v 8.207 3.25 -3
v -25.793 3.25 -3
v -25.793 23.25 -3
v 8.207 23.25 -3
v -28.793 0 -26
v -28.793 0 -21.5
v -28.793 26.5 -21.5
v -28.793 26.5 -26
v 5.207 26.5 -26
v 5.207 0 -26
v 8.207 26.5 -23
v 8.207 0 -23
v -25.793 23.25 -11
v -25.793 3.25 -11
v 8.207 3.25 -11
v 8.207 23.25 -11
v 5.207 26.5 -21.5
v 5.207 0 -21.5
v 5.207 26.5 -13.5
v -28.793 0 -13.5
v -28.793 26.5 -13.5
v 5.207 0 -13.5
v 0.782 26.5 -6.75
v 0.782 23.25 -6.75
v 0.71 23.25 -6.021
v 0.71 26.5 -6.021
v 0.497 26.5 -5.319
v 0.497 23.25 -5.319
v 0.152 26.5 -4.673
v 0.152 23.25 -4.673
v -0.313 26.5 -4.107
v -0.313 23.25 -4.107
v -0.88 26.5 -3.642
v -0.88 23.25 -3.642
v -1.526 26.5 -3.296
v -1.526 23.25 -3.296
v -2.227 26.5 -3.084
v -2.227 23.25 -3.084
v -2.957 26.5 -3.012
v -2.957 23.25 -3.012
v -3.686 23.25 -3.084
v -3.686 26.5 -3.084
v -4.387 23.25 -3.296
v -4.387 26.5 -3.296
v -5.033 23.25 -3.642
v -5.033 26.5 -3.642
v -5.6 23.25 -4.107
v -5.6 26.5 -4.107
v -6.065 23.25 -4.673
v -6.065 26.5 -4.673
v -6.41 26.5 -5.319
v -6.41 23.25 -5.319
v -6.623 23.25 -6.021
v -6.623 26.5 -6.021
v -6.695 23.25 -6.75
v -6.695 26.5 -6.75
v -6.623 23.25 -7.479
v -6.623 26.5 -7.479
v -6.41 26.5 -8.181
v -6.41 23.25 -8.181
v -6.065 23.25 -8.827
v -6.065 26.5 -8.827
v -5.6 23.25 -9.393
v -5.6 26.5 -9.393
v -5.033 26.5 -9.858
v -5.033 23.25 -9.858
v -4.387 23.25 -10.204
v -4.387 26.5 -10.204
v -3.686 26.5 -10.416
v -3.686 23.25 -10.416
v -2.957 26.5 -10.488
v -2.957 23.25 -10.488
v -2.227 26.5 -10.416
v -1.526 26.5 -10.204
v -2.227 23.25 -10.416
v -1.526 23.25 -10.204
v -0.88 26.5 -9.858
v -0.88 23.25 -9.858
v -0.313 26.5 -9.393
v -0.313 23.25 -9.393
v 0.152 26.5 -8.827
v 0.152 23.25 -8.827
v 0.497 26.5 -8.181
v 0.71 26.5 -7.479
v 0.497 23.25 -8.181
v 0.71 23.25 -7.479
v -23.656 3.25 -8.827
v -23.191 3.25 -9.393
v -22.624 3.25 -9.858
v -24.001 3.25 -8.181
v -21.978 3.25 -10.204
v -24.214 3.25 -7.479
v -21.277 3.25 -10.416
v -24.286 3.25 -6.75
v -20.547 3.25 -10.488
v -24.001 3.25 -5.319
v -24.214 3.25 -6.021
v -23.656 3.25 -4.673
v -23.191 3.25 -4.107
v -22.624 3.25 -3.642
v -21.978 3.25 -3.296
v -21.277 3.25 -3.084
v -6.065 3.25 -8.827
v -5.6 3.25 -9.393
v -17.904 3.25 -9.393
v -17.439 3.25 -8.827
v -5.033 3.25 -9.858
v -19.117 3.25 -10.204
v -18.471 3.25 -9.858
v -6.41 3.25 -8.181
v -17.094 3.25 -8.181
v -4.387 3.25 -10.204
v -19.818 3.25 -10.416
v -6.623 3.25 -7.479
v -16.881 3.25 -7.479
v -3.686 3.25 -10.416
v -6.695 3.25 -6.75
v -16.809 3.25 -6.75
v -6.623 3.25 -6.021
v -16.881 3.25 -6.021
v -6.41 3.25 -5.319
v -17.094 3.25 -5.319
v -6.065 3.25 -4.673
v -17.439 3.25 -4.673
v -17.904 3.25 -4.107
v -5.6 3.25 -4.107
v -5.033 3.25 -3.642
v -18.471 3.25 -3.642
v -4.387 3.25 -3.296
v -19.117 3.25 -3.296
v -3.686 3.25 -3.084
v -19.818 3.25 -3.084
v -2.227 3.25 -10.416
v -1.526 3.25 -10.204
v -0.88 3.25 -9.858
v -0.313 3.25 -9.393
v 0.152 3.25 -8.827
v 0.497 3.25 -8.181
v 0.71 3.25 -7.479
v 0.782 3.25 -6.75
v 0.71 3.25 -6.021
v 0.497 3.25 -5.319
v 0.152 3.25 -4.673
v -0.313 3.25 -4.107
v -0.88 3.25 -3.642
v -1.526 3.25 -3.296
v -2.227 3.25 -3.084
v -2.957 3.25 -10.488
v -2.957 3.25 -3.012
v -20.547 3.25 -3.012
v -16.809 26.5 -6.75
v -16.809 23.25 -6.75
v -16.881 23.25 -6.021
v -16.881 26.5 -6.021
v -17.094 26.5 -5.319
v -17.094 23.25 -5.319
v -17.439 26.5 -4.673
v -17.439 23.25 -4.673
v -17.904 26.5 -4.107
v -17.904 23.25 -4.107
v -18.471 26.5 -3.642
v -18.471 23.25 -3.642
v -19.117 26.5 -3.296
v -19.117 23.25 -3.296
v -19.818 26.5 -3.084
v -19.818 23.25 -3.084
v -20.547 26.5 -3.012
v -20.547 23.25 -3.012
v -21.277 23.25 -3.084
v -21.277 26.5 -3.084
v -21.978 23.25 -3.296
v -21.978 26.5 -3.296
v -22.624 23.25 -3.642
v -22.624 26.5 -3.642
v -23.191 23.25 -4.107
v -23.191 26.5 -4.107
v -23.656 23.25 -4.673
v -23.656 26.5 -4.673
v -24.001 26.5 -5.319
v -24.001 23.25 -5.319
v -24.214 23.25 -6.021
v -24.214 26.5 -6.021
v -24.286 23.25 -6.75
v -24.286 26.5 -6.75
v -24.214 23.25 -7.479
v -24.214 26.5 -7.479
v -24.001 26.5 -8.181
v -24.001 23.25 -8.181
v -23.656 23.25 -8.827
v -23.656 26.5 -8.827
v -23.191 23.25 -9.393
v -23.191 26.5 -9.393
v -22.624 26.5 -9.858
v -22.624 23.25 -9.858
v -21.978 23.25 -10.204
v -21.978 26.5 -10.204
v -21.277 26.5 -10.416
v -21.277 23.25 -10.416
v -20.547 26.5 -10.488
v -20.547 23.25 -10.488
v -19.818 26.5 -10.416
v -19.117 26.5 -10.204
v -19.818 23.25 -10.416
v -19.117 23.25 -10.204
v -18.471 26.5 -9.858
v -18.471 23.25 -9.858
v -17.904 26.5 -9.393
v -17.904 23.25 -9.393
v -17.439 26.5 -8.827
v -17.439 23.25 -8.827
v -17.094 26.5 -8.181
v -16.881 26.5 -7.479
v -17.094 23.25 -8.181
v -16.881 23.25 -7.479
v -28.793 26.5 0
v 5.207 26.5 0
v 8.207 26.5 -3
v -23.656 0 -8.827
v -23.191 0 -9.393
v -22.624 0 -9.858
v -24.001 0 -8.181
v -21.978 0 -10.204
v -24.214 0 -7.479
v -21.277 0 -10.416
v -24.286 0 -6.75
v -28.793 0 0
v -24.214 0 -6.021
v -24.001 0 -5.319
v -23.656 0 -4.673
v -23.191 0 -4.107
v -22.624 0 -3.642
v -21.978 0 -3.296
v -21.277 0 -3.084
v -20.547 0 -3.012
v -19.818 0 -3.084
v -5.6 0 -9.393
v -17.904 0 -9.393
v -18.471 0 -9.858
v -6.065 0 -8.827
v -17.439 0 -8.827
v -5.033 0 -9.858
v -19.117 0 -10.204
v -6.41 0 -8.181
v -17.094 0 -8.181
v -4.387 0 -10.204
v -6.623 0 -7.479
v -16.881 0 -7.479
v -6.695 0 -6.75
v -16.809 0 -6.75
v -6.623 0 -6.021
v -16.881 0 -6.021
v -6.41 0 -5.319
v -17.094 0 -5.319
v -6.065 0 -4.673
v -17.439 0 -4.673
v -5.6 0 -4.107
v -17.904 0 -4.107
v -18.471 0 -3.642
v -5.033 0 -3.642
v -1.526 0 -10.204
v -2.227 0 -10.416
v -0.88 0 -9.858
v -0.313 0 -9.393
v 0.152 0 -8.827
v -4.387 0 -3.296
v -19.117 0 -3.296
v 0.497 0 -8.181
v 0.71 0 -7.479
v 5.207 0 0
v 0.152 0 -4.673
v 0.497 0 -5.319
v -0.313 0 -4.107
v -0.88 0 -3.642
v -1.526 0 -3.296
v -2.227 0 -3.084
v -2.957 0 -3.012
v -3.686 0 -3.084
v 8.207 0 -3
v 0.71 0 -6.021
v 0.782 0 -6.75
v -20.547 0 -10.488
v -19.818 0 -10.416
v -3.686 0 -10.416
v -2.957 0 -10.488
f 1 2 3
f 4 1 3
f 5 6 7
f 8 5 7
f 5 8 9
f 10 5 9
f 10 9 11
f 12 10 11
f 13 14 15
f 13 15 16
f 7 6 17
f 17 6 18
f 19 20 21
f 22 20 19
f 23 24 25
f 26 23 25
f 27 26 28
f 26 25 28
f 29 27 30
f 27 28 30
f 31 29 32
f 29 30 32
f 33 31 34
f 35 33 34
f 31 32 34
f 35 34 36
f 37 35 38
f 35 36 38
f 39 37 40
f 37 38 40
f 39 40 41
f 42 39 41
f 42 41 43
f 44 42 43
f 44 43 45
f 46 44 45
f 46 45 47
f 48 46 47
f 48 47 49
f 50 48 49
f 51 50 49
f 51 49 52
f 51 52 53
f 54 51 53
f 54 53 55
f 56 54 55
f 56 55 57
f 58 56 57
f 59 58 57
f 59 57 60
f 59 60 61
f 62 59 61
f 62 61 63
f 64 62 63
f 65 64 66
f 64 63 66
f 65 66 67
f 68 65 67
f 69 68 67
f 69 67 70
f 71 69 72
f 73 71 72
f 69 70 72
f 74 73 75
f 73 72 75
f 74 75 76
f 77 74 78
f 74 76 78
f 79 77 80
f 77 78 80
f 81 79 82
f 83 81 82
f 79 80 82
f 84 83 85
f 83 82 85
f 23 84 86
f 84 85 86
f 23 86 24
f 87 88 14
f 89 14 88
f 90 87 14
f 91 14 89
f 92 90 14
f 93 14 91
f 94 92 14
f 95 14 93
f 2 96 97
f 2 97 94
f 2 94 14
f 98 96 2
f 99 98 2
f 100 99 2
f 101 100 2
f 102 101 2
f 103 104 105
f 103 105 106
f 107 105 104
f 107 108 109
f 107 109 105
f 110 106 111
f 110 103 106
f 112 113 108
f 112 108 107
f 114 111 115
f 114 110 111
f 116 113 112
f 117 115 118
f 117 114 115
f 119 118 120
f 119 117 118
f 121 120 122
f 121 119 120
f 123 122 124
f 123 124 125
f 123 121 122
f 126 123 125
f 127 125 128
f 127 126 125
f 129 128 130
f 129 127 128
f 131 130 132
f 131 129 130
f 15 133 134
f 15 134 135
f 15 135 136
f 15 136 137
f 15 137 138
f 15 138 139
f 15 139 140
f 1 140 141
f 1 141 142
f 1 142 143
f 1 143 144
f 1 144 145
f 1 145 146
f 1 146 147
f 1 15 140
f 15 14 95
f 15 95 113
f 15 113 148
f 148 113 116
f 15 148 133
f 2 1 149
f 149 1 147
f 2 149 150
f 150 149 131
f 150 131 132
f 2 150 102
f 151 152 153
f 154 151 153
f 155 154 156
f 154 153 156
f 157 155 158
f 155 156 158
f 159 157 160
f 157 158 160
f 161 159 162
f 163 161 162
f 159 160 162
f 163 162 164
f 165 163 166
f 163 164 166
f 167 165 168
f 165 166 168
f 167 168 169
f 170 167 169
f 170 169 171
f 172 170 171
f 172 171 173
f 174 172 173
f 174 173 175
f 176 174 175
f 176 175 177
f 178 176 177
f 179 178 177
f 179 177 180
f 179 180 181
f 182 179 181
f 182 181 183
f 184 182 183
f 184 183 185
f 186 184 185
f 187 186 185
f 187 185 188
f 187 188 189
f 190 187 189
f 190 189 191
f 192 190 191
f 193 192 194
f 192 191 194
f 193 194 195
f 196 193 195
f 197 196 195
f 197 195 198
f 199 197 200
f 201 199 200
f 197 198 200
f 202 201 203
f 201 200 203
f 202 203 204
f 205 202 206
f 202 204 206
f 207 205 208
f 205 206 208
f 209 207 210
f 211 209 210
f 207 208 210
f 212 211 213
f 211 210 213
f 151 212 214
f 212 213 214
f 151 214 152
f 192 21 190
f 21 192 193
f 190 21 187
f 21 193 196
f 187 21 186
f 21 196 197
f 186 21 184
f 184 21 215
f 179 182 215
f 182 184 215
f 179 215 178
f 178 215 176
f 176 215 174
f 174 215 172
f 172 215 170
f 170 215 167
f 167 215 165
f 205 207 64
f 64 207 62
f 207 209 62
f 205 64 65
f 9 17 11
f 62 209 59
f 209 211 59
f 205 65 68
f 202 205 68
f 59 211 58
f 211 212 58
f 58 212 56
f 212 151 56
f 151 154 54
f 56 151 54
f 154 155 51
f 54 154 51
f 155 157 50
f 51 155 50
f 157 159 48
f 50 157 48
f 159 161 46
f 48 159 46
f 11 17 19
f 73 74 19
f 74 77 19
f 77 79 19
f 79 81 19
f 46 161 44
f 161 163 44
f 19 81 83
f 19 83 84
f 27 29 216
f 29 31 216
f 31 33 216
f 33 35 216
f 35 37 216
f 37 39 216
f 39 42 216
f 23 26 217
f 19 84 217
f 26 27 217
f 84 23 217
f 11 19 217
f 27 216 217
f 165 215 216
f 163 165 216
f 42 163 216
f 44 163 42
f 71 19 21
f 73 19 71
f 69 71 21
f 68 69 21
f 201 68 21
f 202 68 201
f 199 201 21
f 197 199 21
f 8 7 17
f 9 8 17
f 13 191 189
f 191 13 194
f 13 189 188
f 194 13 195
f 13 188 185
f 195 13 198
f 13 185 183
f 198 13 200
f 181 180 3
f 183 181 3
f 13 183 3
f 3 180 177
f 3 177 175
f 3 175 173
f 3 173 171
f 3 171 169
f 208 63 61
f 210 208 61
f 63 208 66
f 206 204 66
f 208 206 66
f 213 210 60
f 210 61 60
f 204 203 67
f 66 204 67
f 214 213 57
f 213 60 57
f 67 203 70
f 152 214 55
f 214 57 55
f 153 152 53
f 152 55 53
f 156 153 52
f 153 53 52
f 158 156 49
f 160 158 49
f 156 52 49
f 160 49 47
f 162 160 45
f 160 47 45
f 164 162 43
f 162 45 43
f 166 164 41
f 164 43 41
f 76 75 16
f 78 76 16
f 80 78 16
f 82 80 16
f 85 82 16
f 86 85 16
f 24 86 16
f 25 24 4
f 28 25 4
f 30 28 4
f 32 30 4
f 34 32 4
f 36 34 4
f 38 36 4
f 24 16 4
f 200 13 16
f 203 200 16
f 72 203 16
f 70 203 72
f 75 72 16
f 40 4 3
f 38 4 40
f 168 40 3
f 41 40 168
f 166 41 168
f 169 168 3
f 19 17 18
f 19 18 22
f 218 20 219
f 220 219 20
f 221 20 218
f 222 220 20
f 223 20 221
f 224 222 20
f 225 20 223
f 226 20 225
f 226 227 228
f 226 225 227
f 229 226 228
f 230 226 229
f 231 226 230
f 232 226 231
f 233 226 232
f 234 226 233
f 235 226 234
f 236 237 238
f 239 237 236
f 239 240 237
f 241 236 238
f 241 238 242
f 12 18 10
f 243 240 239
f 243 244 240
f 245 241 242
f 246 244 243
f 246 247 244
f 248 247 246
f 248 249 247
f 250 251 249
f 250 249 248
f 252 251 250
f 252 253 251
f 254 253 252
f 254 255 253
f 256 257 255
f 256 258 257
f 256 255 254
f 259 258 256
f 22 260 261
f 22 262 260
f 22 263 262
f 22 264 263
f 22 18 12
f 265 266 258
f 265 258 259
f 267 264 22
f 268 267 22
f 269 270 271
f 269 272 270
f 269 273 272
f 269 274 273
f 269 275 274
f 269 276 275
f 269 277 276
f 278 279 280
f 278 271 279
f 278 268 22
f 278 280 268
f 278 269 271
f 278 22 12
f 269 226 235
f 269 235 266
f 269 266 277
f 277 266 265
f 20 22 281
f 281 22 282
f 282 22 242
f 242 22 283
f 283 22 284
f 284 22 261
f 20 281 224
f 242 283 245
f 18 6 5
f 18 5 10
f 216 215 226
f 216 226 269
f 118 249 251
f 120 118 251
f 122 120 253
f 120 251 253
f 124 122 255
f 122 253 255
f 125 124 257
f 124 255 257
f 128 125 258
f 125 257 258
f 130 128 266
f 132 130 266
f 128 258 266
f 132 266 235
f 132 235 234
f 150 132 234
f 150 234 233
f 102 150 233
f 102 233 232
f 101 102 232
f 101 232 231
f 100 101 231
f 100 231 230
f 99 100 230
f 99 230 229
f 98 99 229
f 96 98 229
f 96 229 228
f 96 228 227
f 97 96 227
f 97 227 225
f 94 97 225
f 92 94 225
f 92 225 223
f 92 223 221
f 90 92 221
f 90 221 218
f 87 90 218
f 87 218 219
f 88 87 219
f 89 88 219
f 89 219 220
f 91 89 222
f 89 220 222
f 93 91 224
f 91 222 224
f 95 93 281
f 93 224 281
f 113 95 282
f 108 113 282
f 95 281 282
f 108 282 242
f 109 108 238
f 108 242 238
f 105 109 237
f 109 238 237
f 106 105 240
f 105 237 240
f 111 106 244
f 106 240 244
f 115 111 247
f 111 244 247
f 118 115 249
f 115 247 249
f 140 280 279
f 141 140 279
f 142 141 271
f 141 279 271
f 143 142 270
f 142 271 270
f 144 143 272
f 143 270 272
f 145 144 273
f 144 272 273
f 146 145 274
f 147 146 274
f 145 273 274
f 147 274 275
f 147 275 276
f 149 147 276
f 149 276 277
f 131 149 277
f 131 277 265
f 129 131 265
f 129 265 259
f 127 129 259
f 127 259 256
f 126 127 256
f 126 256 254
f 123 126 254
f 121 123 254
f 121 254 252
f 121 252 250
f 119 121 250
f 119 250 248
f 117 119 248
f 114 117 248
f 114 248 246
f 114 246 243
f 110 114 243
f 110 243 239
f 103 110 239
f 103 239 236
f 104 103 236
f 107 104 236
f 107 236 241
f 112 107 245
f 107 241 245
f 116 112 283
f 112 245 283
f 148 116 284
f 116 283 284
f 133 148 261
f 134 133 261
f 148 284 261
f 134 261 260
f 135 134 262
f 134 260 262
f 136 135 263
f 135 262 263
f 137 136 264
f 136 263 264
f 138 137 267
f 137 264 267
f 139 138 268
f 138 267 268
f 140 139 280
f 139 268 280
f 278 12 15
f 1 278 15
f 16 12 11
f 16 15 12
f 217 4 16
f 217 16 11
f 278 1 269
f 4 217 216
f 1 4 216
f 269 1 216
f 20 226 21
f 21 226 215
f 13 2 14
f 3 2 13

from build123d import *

# Parameters (mm, degrees)
F0_W     = 37
F0_H     = 26.5
F1_DEPTH = 26
F2_W     = 34
F2_H     = 8
F2_R     = 3.738116
F3_DEPTH = 26.501
F4_W     = 20
F4_H     = 8
F5_DEPTH = 34
F7_DEPTH = 26.501


with BuildPart() as f1:
    # F0 (on Top) → F1 (new body)
    with BuildSketch(Plane.XY):
        with Locations((-10.29259, 13.25)):
            Rectangle(F0_W, F0_H)
    extrude(amount=-F1_DEPTH)

    # F2 (on Front) → F3 (cut, through all)
    with BuildSketch(Plane.XZ):
        with Locations((-11.79259, -17.5)):
            Rectangle(F2_W, F2_H)
        with Locations((-20.547456, -6.75)):
            Circle(F2_R)
        with Locations((-2.956501, -6.75)):
            Circle(F2_R)
    extrude(amount=-F3_DEPTH, mode=Mode.SUBTRACT)

    # F4 (on face) → F5 (cut)
    with BuildSketch(Plane.YZ.offset(8.20741)):
        with Locations((13.25, -7)):
            Rectangle(F4_W, F4_H)
    extrude(amount=-F5_DEPTH, mode=Mode.SUBTRACT)

    # F6 (on face) → F7 (cut, through all)
    with BuildSketch(Plane(origin=(0, 26.5, 0), x_dir=(-1, 0, 0), z_dir=(0, 1, 0))):
        Polygon((-8.20741, 0), (-8.20741, -3), (-5.20741, 0), align=None)
        Polygon((-8.20741, -23), (-8.20741, -26), (-5.20741, -26), align=None)
    extrude(amount=-F7_DEPTH, mode=Mode.SUBTRACT)


solid = f1.part
